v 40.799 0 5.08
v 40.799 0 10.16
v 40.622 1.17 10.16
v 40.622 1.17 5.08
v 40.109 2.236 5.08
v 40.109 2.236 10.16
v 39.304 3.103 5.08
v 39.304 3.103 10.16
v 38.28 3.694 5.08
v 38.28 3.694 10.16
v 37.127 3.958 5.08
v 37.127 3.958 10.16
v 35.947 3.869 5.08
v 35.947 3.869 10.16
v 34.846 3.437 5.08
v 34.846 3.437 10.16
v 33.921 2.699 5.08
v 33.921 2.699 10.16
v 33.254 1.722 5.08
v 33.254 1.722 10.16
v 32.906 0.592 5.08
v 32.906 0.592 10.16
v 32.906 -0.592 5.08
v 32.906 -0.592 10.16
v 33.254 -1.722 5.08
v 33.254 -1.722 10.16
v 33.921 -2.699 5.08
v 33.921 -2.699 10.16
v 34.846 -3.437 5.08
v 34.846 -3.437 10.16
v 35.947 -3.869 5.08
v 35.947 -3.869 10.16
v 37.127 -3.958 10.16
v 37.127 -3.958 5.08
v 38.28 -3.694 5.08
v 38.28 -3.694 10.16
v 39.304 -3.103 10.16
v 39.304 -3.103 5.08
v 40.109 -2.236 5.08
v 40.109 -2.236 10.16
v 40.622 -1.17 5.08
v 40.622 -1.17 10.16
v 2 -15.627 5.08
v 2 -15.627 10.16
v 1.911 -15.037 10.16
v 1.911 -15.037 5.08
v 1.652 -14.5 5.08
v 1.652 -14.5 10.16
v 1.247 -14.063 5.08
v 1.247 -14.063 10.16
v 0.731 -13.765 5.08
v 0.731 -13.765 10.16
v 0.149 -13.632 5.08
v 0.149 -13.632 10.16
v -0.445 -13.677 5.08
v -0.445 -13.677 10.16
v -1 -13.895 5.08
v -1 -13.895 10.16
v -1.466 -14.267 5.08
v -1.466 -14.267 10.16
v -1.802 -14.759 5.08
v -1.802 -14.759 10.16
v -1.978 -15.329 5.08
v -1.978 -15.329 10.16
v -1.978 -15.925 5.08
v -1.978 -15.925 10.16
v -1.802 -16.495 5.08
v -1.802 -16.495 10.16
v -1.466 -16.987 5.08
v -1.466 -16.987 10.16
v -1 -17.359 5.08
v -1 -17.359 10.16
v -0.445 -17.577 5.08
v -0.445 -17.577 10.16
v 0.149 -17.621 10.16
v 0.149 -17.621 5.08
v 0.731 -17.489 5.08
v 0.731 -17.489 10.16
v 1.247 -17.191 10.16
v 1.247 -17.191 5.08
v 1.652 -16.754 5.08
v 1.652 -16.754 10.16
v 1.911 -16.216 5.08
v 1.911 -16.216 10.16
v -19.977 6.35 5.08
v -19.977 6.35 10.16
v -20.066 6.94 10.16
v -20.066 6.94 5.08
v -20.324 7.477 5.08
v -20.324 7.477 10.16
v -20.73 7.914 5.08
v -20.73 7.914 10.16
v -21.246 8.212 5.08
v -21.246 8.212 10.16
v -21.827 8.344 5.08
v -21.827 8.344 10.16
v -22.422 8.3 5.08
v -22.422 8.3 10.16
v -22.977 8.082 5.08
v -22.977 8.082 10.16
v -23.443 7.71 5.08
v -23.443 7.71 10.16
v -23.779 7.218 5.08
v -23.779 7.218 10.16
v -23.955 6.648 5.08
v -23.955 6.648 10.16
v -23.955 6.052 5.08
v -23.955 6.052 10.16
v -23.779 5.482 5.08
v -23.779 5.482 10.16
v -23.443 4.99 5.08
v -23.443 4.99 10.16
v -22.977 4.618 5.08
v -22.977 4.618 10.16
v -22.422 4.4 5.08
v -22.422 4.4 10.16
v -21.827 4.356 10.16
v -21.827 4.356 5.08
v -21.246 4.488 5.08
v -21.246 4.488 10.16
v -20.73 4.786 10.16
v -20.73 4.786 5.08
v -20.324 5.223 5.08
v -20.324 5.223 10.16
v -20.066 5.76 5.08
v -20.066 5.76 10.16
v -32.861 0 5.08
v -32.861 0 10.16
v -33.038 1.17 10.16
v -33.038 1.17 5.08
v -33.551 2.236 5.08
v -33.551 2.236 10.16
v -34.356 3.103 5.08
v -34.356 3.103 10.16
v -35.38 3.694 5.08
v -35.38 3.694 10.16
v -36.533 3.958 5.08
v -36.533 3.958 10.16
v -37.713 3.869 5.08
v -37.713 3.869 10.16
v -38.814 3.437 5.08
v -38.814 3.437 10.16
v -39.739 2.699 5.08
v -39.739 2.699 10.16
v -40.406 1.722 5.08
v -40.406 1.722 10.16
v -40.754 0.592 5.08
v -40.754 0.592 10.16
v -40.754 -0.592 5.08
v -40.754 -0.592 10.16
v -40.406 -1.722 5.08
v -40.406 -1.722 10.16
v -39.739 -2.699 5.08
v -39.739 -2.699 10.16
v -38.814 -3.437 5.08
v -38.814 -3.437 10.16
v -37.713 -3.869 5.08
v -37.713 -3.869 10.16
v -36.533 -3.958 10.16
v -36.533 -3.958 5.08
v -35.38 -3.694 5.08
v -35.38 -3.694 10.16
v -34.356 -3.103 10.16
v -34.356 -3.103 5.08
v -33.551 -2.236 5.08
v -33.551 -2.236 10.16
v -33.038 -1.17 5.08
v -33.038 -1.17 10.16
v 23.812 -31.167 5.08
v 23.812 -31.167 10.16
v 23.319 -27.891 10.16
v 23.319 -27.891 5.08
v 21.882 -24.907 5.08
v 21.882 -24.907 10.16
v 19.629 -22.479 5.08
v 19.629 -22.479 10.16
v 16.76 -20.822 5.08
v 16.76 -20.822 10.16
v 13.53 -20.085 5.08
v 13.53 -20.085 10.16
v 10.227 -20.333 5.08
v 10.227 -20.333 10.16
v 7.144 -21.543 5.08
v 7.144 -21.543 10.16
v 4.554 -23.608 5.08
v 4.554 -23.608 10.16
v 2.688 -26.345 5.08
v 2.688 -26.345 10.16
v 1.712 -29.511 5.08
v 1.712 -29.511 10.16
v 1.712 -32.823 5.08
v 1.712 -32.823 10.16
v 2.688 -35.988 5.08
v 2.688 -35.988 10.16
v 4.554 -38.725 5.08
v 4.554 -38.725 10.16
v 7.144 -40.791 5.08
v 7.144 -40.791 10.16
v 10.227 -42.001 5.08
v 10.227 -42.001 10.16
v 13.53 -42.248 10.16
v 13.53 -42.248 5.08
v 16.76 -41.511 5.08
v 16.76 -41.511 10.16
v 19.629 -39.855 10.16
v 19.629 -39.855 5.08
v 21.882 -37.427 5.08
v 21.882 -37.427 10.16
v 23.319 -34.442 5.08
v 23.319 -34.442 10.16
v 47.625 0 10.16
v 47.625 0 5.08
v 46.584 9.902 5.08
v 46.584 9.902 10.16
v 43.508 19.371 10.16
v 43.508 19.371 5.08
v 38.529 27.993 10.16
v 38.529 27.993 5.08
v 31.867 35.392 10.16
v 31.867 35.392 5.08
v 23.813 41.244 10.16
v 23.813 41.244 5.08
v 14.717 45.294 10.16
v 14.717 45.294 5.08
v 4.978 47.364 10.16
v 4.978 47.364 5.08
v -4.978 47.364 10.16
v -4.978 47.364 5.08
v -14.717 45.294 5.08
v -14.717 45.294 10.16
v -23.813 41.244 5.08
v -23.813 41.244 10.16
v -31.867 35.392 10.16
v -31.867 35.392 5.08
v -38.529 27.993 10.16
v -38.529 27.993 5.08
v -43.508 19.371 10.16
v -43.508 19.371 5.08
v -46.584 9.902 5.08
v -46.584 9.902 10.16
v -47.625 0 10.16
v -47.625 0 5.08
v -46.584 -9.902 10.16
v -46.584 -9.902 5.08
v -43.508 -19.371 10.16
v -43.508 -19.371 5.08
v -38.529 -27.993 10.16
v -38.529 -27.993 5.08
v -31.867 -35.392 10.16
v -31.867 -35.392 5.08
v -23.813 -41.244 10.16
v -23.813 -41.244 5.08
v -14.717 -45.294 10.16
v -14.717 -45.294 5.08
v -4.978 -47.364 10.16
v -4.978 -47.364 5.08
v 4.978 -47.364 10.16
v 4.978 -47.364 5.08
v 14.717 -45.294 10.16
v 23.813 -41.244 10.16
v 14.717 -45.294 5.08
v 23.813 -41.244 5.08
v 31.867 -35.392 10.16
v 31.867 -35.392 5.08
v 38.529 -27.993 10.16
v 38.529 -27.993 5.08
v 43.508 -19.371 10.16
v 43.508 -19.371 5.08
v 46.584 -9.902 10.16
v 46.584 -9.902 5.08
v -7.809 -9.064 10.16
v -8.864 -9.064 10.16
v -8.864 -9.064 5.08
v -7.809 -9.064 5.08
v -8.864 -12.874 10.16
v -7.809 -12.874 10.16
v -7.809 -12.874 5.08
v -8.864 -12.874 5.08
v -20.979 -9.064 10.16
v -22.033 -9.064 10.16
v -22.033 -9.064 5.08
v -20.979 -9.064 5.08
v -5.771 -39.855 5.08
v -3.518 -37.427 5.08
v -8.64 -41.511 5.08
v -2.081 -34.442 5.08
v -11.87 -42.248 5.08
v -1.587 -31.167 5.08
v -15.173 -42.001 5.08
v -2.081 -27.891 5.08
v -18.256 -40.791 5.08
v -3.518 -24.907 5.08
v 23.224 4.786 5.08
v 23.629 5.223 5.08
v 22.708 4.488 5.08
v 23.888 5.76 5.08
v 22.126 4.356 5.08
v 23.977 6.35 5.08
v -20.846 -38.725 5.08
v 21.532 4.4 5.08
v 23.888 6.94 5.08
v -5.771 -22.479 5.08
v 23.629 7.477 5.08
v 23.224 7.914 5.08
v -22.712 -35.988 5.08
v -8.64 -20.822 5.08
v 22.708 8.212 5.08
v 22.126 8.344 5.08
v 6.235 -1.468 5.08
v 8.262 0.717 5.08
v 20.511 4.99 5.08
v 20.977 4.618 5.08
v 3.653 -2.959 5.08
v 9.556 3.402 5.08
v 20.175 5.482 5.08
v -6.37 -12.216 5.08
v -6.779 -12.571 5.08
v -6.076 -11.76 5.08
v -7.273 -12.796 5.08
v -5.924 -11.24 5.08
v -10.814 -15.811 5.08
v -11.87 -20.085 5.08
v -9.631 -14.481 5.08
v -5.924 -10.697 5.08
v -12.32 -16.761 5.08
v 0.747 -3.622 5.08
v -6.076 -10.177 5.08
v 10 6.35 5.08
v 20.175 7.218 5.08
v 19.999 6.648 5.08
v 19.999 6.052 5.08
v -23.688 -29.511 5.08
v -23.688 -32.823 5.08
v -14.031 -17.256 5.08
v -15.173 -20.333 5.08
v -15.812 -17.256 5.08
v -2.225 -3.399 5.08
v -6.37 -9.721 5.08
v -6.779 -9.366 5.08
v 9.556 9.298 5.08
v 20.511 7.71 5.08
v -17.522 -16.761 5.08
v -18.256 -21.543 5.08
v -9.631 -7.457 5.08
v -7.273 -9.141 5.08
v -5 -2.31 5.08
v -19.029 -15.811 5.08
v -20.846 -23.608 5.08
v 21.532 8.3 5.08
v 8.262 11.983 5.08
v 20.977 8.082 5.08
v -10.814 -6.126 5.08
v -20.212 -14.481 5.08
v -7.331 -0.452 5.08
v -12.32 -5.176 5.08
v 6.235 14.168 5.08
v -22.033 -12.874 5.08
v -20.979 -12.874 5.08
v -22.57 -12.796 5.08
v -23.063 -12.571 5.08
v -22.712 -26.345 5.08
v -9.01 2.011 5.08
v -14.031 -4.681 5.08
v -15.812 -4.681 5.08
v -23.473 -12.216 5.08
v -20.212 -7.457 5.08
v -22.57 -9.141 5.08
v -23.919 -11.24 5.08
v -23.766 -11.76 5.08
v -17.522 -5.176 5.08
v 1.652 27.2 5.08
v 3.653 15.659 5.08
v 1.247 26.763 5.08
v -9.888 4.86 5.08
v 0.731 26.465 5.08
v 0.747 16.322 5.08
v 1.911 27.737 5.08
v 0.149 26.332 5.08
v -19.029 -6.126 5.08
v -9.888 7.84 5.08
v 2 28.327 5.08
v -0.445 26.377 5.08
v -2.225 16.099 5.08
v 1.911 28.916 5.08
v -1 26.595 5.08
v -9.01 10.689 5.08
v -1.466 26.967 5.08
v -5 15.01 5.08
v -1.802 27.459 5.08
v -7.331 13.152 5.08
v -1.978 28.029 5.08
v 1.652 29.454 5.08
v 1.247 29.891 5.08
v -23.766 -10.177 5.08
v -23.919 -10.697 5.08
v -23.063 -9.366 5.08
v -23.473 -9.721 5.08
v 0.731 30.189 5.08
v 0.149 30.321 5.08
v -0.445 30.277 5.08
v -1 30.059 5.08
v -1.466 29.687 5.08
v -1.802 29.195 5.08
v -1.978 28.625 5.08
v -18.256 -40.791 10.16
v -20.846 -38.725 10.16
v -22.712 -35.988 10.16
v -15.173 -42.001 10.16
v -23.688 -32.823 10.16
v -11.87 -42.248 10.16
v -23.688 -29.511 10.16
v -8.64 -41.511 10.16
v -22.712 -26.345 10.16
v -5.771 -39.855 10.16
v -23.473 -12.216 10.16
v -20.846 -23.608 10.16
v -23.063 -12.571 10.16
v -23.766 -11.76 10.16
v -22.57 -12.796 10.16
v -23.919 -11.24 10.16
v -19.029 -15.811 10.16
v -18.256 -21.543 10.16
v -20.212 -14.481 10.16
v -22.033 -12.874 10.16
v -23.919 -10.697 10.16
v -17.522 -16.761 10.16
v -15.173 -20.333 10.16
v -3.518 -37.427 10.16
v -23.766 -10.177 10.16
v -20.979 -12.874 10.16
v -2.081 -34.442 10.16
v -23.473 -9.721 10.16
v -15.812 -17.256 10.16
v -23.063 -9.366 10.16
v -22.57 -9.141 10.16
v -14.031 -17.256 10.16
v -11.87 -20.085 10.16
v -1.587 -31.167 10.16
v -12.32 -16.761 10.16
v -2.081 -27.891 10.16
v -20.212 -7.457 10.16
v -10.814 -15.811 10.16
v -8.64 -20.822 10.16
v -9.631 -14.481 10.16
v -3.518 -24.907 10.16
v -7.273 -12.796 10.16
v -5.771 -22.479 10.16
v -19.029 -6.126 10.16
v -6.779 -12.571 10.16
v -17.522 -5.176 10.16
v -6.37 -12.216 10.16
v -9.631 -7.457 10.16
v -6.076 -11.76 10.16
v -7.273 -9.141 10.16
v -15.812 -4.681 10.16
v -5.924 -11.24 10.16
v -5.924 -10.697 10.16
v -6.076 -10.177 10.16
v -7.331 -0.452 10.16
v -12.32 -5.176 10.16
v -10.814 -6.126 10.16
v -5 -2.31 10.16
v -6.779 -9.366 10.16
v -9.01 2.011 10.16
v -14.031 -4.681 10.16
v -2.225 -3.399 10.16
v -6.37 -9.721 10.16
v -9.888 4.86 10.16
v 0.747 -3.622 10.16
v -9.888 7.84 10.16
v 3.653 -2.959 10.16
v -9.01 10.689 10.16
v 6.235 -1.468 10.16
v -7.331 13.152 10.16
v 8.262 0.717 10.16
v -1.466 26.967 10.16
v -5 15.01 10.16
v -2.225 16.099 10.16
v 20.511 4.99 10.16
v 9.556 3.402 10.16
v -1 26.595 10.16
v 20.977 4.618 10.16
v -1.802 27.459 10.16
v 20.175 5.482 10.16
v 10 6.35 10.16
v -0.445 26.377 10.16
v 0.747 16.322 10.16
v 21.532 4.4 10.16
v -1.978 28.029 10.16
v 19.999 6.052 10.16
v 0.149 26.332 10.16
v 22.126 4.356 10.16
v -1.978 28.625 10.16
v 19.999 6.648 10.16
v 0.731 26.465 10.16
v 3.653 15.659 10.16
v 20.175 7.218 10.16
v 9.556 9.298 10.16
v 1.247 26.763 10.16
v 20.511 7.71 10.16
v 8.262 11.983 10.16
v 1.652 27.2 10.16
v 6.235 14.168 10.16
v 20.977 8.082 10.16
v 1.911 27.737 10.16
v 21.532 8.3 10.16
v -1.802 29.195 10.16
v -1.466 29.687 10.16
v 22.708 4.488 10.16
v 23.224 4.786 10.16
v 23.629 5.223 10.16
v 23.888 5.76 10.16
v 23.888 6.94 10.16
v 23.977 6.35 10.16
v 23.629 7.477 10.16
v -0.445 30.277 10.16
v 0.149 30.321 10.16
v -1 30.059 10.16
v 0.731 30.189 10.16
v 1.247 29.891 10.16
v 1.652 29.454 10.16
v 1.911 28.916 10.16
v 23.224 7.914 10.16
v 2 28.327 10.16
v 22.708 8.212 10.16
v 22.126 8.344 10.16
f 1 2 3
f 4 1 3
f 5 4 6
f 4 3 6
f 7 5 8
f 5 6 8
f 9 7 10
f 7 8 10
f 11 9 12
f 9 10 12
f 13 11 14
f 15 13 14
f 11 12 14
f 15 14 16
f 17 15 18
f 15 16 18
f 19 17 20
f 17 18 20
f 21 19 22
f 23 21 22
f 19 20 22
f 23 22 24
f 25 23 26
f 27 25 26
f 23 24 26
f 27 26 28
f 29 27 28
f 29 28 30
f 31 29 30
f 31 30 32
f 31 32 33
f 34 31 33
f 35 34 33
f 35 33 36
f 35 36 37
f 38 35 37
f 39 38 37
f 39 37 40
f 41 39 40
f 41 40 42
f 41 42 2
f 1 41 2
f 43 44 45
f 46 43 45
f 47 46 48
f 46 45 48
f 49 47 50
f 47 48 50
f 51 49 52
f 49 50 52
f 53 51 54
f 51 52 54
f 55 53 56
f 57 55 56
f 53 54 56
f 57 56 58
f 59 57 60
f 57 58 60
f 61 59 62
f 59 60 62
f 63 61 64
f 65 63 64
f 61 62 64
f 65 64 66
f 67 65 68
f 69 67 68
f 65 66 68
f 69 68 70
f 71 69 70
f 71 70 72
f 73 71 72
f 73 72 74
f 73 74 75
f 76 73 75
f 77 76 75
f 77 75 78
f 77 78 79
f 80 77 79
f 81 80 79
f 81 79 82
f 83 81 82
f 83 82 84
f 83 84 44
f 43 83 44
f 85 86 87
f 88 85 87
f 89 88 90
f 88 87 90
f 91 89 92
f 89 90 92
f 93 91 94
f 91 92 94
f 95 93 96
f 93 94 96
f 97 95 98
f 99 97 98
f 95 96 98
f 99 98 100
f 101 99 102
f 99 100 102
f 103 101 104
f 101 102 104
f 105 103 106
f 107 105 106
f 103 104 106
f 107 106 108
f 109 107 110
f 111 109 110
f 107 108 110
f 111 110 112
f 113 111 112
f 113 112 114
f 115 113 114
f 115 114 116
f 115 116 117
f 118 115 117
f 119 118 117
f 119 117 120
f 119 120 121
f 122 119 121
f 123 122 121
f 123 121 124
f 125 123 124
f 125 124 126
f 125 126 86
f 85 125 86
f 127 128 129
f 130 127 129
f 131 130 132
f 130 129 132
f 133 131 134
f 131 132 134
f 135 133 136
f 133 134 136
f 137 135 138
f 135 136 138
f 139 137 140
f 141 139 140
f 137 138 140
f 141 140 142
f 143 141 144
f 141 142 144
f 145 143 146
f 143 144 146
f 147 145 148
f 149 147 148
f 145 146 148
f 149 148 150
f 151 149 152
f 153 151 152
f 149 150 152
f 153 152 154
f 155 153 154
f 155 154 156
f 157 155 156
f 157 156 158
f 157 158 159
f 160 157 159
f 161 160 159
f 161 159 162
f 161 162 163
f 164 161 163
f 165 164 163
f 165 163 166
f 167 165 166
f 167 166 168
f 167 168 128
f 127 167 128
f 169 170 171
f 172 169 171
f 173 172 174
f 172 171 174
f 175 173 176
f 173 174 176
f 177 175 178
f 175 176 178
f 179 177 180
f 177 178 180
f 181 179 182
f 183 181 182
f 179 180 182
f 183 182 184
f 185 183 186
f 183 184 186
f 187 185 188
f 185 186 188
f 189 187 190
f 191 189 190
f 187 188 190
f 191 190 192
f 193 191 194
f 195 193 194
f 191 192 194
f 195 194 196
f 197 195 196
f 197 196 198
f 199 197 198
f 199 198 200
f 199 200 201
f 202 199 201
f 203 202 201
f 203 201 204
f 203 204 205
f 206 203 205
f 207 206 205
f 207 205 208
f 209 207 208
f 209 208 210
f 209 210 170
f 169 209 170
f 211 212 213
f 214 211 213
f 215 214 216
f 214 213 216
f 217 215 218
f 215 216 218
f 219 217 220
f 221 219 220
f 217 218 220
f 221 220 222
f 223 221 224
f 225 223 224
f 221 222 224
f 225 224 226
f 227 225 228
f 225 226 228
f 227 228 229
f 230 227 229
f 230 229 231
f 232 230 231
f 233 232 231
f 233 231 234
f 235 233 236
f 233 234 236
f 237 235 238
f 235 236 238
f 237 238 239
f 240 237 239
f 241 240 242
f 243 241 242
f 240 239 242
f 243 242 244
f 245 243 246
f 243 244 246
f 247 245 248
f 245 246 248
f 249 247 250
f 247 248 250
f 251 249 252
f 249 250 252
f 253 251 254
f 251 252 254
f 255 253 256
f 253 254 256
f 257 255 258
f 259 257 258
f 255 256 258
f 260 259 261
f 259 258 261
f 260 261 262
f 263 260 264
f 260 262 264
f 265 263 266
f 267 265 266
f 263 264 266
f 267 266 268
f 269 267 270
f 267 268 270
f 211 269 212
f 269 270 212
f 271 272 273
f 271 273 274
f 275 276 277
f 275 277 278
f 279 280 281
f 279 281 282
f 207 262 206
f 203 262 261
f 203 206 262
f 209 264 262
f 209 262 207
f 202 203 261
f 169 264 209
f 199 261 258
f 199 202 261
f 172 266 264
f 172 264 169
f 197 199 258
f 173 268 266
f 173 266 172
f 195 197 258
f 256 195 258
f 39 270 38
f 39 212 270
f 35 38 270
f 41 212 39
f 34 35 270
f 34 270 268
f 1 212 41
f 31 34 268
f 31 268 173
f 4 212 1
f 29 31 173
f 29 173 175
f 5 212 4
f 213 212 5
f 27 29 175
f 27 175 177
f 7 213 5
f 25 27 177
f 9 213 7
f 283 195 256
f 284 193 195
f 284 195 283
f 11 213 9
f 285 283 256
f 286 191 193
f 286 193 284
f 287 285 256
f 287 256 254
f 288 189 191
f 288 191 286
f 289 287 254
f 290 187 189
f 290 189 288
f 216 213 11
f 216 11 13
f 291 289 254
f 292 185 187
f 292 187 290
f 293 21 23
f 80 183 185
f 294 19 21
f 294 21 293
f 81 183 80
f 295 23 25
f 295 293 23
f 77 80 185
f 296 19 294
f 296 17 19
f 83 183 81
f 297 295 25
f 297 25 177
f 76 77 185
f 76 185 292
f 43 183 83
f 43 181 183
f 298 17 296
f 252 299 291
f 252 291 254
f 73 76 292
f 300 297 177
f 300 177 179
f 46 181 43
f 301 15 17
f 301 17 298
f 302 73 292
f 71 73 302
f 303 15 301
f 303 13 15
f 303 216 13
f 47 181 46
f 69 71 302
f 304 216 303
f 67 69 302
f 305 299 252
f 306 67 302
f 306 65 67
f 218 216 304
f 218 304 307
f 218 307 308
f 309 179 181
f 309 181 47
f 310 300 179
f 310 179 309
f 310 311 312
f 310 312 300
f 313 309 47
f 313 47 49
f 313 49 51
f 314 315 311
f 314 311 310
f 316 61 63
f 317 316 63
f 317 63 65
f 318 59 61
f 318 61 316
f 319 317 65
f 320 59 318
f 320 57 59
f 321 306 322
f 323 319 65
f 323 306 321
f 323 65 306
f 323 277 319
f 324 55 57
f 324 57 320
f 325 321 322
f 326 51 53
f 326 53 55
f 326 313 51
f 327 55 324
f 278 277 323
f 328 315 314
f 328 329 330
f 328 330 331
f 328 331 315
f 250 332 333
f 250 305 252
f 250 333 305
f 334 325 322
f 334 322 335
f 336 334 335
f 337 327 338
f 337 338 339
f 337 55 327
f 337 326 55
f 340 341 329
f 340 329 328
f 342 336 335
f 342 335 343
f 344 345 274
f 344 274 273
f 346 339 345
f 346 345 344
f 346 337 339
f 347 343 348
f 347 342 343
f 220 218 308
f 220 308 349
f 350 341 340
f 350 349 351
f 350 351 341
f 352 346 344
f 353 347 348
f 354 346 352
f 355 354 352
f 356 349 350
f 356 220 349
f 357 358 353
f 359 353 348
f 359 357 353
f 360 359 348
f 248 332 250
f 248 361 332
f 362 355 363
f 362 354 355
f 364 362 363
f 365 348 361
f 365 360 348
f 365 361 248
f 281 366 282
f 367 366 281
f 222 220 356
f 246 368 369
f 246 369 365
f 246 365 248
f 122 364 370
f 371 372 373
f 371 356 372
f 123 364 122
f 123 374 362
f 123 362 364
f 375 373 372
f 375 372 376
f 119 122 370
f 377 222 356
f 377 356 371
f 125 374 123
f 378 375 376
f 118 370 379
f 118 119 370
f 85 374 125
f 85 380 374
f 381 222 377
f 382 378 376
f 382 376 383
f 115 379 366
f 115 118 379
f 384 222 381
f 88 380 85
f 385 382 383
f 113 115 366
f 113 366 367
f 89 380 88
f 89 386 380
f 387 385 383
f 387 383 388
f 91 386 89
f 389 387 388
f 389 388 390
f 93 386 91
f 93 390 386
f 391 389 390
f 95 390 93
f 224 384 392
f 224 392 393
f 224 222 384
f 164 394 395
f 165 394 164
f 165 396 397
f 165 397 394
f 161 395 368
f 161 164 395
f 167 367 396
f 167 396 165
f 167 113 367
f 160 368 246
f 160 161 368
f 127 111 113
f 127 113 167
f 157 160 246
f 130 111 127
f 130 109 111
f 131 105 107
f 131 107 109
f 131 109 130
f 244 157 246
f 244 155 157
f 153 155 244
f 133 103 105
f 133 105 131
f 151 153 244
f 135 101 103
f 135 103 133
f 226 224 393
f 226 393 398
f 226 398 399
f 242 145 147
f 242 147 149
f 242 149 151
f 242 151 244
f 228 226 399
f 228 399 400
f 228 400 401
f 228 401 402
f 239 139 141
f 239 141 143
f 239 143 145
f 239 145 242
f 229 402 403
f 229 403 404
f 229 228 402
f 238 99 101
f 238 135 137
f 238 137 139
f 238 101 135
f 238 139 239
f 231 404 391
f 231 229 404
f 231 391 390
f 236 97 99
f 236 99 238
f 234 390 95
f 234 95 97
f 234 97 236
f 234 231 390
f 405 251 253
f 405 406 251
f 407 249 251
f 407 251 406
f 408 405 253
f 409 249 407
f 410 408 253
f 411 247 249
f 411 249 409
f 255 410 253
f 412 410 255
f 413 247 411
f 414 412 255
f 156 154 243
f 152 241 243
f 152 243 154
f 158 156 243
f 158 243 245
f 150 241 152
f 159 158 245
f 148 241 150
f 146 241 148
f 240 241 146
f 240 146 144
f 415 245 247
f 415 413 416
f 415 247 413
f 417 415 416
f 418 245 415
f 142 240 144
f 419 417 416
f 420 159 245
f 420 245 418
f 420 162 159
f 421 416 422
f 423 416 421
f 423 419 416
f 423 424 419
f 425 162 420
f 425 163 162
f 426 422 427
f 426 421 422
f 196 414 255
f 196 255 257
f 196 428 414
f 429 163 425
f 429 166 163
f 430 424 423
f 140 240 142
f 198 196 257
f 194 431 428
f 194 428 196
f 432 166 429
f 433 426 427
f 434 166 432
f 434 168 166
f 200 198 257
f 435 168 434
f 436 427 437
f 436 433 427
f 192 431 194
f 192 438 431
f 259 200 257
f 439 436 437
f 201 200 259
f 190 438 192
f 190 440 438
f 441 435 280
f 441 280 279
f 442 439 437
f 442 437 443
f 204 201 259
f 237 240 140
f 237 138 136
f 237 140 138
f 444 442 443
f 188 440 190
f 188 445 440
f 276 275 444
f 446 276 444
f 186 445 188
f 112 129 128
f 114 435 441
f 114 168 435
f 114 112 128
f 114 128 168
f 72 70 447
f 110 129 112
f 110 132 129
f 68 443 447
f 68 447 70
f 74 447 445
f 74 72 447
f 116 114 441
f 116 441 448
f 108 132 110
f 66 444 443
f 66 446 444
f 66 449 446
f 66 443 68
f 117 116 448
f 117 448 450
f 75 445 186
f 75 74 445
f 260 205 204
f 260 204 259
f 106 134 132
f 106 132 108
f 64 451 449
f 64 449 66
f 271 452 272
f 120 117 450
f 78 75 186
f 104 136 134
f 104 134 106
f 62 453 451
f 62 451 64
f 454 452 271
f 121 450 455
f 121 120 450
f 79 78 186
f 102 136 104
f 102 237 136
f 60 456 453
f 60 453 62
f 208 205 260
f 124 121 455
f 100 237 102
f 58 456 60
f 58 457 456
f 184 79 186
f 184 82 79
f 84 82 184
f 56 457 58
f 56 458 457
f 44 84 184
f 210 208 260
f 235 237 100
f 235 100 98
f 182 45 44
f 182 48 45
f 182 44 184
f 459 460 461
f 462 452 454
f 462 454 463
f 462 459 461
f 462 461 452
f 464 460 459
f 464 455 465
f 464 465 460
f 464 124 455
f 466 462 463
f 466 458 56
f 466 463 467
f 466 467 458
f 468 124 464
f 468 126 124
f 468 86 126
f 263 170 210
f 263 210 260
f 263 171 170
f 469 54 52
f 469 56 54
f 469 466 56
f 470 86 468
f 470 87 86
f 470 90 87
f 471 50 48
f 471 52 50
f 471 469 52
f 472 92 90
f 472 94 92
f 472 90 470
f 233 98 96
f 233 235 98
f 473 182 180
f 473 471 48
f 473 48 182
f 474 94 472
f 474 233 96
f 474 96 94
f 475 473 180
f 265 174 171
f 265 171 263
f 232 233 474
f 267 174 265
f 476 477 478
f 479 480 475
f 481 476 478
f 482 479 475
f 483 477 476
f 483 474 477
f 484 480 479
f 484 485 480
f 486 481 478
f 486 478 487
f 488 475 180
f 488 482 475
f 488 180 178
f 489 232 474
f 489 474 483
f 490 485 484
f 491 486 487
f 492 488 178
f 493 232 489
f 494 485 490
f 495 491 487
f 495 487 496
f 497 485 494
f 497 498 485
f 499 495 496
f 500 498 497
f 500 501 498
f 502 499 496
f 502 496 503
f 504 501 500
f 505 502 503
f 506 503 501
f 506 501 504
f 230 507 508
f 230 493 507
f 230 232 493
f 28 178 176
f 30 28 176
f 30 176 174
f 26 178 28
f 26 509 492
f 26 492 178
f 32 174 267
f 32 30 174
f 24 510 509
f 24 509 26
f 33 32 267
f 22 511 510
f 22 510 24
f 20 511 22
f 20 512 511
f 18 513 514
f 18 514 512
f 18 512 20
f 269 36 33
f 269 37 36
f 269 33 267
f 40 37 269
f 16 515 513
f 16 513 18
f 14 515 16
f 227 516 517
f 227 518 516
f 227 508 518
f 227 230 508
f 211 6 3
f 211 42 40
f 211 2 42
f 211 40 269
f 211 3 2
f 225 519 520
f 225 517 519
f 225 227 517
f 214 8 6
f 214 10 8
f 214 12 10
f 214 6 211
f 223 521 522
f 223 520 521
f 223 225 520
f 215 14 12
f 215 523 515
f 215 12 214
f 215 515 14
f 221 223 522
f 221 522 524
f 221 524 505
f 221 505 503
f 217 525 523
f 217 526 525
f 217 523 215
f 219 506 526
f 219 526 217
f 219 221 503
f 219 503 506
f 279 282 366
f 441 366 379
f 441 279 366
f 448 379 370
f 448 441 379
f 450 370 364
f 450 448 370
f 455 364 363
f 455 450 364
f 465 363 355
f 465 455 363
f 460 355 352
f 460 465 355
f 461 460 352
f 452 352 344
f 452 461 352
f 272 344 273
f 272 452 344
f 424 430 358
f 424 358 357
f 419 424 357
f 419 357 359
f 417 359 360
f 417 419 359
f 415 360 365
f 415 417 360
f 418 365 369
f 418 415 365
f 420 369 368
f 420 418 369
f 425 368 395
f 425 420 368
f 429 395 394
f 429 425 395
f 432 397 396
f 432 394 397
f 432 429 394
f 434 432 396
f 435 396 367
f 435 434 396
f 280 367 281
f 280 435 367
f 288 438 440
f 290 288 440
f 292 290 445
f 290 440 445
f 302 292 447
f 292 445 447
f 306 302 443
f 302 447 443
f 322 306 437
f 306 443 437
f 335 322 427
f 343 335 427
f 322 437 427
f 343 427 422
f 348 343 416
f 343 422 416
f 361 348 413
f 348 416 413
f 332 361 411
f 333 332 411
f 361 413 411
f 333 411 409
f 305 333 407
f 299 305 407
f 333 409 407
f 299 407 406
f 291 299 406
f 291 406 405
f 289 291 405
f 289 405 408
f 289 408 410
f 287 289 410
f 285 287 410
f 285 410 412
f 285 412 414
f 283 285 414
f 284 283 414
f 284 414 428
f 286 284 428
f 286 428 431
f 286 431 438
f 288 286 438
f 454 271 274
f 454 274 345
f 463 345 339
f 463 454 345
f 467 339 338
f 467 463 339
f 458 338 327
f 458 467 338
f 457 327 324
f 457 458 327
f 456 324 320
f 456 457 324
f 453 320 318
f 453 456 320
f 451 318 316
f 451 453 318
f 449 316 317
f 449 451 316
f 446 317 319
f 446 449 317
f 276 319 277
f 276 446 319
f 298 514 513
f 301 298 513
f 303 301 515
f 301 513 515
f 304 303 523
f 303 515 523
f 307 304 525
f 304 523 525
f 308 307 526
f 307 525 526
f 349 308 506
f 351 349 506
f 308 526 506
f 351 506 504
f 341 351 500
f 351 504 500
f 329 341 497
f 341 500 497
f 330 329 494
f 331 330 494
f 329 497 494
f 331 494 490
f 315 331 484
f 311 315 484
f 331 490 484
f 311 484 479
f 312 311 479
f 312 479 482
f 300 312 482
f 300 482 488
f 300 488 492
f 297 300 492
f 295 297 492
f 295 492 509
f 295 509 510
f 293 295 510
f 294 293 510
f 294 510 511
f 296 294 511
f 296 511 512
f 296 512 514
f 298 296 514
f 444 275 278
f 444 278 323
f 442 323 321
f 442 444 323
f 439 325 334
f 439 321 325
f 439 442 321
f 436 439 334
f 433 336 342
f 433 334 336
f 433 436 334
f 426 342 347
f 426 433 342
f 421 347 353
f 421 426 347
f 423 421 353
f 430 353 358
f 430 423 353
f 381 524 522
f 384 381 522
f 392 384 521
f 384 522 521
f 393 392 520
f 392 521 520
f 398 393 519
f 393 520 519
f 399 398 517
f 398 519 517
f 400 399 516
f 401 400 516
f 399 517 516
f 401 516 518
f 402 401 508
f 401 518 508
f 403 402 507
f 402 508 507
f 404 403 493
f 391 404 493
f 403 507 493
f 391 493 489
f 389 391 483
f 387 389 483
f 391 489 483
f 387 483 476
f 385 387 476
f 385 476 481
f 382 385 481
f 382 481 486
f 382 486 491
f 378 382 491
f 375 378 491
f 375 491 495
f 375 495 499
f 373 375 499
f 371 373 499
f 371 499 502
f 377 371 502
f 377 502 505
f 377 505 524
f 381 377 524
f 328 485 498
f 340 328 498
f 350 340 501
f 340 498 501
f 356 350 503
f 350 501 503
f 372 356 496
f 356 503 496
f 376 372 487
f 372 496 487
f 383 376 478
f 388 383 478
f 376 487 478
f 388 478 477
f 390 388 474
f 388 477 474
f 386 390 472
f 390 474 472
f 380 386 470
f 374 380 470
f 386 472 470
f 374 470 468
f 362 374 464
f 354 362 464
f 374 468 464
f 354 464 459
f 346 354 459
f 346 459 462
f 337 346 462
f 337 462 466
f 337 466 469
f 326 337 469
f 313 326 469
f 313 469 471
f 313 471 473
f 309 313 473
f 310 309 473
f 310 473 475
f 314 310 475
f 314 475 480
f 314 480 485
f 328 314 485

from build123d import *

# Parameters (mm, degrees)
SKETCH1_R           = 49.5046
BOSS_EXTRUDE1_DEPTH = 5.08
SKETCH2_R           = 47.625
BOSS_EXTRUDE2_DEPTH = 5.08
SKETCH3_R           = 11.1125
SKETCH3_R_2         = 3.96875
SKETCH3_R_3         = 10
SKETCH3_R_4         = 2
CUT_EXTRUDE1_DEPTH  = 11.16
SKETCH7_R           = 52.166274697
CUT_EXTRUDE4_DEPTH  = 5.08


with BuildPart() as part:
    # Sketch1 → Boss-Extrude1 (new body)
    with BuildSketch(Plane.XY):
        Circle(SKETCH1_R)
    extrude(amount=BOSS_EXTRUDE1_DEPTH)

    # Sketch2 → Boss-Extrude2 (add)
    with BuildSketch(Plane.XY.offset(5.08)):
        Circle(SKETCH2_R)
    extrude(amount=BOSS_EXTRUDE2_DEPTH)

    # Sketch3 → Cut-Extrude1 (cut, through all)
    with BuildSketch(Plane.XY.offset(10.16)):
        with Locations((-12.7, -31.166793627)):
            Circle(SKETCH3_R)
        with Locations((12.7, -31.166793627)):
            Circle(SKETCH3_R)
        with Locations((-36.83, 0)):
            Circle(SKETCH3_R_2)
        with Locations((36.83, 0)):
            Circle(SKETCH3_R_2)
        with Locations((0, 6.35)):
            Circle(SKETCH3_R_3)
        with Locations((0, 28.326878759)):
            Circle(SKETCH3_R_4)
        with Locations((21.976878759, 6.35)):
            Circle(SKETCH3_R_4)
        with Locations((0, -15.626878759)):
            Circle(SKETCH3_R_4)
        with Locations((-21.976878759, 6.35)):
            Circle(SKETCH3_R_4)
        with BuildLine():
            Line((-7.809345457, -12.873575281), (-8.863831528, -12.873575281))
            ThreePointArc((-8.863831528, -12.873575281), (-14.921345457, -17.318575281), (-20.978859386, -12.873575281))
            Line((-20.978859386, -12.873575281), (-22.033345457, -12.873575281))
            ThreePointArc((-22.033345457, -12.873575281), (-23.938345457, -10.968575281), (-22.033345457, -9.063575281))
            Line((-22.033345457, -9.063575281), (-20.978859386, -9.063575281))
            ThreePointArc((-20.978859386, -9.063575281), (-14.921345457, -4.618575281), (-8.863831528, -9.063575281))
            Line((-8.863831528, -9.063575281), (-7.809345457, -9.063575281))
            ThreePointArc((-7.809345457, -9.063575281), (-5.904345457, -10.968575281), (-7.809345457, -12.873575281))
        make_face()
    extrude(amount=-CUT_EXTRUDE1_DEPTH, mode=Mode.SUBTRACT)

    # Sketch7 → Cut-Extrude4 (cut)
    with BuildSketch(Plane(origin=(0, 0, 0), x_dir=(-1, 0, 0), z_dir=(0, 0, -1))):
        Circle(SKETCH7_R)
    extrude(amount=-CUT_EXTRUDE4_DEPTH, mode=Mode.SUBTRACT)


solid = part.part
